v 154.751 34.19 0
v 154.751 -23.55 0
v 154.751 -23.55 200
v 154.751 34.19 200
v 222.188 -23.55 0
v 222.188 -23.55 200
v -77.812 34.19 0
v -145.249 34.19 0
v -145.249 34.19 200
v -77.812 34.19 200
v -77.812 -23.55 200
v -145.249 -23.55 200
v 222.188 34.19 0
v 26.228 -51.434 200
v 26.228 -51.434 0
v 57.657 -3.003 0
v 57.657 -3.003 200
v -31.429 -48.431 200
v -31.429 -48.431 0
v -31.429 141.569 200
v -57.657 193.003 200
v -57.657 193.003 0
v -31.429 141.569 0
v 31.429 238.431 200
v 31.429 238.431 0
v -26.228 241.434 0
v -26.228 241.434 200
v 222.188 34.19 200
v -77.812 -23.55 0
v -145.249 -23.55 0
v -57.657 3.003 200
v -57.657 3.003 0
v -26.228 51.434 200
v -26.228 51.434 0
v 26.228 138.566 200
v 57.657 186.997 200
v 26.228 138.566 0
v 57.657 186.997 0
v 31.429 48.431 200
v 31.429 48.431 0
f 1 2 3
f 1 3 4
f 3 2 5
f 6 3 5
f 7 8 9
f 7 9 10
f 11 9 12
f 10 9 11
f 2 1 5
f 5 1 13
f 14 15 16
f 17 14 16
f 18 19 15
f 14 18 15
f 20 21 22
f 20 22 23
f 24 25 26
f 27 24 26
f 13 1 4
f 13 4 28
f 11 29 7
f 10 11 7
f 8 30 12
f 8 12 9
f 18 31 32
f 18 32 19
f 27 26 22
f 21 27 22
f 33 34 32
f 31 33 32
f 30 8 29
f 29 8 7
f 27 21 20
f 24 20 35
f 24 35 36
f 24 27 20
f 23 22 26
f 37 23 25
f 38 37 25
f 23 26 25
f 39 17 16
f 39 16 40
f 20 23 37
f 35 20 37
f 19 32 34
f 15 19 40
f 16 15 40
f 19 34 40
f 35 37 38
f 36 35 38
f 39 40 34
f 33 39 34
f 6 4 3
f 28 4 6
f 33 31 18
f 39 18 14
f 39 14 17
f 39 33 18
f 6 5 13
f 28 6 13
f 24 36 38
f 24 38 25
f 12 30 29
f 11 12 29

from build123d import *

# Parameters (mm, degrees)
BOSS_EXTRUDE1_DEPTH = 200
SKETCH2_W           = 67.437110829
SKETCH2_H           = 57.74
BOSS_EXTRUDE2_DEPTH = 200


with BuildPart() as part:
    # Sketch1 → Boss-Extrude1 (new body)
    with BuildSketch(Plane.XY):
        Polygon((57.656877736, -3.002962382), (31.429080577, 48.430839631), (-26.227797159, 51.433802013), (-57.656877736, 3.002962382), (-31.429080577, -48.430839631), (26.227797159, -51.433802013), align=None)
    extrude(amount=BOSS_EXTRUDE1_DEPTH)


with BuildPart() as body_2:
    # Sketch2 → Boss-Extrude2 (new body)
    with BuildSketch(Plane.XY):
        with Locations((-111.530606371, 5.320143602)):
            Rectangle(SKETCH2_W, SKETCH2_H)
    extrude(amount=BOSS_EXTRUDE2_DEPTH)


with BuildPart() as body_3:
    # Body-Move/Copy1: copy of body 2
    add(body_2.part.moved(Location((300, 0, 0))))


with BuildPart() as body_4:
    # Body-Move/Copy2: copy of part
    add(part.part.moved(Location((0, 190, 0))))


solid = Compound([part.part, body_2.part, body_3.part, body_4.part])
